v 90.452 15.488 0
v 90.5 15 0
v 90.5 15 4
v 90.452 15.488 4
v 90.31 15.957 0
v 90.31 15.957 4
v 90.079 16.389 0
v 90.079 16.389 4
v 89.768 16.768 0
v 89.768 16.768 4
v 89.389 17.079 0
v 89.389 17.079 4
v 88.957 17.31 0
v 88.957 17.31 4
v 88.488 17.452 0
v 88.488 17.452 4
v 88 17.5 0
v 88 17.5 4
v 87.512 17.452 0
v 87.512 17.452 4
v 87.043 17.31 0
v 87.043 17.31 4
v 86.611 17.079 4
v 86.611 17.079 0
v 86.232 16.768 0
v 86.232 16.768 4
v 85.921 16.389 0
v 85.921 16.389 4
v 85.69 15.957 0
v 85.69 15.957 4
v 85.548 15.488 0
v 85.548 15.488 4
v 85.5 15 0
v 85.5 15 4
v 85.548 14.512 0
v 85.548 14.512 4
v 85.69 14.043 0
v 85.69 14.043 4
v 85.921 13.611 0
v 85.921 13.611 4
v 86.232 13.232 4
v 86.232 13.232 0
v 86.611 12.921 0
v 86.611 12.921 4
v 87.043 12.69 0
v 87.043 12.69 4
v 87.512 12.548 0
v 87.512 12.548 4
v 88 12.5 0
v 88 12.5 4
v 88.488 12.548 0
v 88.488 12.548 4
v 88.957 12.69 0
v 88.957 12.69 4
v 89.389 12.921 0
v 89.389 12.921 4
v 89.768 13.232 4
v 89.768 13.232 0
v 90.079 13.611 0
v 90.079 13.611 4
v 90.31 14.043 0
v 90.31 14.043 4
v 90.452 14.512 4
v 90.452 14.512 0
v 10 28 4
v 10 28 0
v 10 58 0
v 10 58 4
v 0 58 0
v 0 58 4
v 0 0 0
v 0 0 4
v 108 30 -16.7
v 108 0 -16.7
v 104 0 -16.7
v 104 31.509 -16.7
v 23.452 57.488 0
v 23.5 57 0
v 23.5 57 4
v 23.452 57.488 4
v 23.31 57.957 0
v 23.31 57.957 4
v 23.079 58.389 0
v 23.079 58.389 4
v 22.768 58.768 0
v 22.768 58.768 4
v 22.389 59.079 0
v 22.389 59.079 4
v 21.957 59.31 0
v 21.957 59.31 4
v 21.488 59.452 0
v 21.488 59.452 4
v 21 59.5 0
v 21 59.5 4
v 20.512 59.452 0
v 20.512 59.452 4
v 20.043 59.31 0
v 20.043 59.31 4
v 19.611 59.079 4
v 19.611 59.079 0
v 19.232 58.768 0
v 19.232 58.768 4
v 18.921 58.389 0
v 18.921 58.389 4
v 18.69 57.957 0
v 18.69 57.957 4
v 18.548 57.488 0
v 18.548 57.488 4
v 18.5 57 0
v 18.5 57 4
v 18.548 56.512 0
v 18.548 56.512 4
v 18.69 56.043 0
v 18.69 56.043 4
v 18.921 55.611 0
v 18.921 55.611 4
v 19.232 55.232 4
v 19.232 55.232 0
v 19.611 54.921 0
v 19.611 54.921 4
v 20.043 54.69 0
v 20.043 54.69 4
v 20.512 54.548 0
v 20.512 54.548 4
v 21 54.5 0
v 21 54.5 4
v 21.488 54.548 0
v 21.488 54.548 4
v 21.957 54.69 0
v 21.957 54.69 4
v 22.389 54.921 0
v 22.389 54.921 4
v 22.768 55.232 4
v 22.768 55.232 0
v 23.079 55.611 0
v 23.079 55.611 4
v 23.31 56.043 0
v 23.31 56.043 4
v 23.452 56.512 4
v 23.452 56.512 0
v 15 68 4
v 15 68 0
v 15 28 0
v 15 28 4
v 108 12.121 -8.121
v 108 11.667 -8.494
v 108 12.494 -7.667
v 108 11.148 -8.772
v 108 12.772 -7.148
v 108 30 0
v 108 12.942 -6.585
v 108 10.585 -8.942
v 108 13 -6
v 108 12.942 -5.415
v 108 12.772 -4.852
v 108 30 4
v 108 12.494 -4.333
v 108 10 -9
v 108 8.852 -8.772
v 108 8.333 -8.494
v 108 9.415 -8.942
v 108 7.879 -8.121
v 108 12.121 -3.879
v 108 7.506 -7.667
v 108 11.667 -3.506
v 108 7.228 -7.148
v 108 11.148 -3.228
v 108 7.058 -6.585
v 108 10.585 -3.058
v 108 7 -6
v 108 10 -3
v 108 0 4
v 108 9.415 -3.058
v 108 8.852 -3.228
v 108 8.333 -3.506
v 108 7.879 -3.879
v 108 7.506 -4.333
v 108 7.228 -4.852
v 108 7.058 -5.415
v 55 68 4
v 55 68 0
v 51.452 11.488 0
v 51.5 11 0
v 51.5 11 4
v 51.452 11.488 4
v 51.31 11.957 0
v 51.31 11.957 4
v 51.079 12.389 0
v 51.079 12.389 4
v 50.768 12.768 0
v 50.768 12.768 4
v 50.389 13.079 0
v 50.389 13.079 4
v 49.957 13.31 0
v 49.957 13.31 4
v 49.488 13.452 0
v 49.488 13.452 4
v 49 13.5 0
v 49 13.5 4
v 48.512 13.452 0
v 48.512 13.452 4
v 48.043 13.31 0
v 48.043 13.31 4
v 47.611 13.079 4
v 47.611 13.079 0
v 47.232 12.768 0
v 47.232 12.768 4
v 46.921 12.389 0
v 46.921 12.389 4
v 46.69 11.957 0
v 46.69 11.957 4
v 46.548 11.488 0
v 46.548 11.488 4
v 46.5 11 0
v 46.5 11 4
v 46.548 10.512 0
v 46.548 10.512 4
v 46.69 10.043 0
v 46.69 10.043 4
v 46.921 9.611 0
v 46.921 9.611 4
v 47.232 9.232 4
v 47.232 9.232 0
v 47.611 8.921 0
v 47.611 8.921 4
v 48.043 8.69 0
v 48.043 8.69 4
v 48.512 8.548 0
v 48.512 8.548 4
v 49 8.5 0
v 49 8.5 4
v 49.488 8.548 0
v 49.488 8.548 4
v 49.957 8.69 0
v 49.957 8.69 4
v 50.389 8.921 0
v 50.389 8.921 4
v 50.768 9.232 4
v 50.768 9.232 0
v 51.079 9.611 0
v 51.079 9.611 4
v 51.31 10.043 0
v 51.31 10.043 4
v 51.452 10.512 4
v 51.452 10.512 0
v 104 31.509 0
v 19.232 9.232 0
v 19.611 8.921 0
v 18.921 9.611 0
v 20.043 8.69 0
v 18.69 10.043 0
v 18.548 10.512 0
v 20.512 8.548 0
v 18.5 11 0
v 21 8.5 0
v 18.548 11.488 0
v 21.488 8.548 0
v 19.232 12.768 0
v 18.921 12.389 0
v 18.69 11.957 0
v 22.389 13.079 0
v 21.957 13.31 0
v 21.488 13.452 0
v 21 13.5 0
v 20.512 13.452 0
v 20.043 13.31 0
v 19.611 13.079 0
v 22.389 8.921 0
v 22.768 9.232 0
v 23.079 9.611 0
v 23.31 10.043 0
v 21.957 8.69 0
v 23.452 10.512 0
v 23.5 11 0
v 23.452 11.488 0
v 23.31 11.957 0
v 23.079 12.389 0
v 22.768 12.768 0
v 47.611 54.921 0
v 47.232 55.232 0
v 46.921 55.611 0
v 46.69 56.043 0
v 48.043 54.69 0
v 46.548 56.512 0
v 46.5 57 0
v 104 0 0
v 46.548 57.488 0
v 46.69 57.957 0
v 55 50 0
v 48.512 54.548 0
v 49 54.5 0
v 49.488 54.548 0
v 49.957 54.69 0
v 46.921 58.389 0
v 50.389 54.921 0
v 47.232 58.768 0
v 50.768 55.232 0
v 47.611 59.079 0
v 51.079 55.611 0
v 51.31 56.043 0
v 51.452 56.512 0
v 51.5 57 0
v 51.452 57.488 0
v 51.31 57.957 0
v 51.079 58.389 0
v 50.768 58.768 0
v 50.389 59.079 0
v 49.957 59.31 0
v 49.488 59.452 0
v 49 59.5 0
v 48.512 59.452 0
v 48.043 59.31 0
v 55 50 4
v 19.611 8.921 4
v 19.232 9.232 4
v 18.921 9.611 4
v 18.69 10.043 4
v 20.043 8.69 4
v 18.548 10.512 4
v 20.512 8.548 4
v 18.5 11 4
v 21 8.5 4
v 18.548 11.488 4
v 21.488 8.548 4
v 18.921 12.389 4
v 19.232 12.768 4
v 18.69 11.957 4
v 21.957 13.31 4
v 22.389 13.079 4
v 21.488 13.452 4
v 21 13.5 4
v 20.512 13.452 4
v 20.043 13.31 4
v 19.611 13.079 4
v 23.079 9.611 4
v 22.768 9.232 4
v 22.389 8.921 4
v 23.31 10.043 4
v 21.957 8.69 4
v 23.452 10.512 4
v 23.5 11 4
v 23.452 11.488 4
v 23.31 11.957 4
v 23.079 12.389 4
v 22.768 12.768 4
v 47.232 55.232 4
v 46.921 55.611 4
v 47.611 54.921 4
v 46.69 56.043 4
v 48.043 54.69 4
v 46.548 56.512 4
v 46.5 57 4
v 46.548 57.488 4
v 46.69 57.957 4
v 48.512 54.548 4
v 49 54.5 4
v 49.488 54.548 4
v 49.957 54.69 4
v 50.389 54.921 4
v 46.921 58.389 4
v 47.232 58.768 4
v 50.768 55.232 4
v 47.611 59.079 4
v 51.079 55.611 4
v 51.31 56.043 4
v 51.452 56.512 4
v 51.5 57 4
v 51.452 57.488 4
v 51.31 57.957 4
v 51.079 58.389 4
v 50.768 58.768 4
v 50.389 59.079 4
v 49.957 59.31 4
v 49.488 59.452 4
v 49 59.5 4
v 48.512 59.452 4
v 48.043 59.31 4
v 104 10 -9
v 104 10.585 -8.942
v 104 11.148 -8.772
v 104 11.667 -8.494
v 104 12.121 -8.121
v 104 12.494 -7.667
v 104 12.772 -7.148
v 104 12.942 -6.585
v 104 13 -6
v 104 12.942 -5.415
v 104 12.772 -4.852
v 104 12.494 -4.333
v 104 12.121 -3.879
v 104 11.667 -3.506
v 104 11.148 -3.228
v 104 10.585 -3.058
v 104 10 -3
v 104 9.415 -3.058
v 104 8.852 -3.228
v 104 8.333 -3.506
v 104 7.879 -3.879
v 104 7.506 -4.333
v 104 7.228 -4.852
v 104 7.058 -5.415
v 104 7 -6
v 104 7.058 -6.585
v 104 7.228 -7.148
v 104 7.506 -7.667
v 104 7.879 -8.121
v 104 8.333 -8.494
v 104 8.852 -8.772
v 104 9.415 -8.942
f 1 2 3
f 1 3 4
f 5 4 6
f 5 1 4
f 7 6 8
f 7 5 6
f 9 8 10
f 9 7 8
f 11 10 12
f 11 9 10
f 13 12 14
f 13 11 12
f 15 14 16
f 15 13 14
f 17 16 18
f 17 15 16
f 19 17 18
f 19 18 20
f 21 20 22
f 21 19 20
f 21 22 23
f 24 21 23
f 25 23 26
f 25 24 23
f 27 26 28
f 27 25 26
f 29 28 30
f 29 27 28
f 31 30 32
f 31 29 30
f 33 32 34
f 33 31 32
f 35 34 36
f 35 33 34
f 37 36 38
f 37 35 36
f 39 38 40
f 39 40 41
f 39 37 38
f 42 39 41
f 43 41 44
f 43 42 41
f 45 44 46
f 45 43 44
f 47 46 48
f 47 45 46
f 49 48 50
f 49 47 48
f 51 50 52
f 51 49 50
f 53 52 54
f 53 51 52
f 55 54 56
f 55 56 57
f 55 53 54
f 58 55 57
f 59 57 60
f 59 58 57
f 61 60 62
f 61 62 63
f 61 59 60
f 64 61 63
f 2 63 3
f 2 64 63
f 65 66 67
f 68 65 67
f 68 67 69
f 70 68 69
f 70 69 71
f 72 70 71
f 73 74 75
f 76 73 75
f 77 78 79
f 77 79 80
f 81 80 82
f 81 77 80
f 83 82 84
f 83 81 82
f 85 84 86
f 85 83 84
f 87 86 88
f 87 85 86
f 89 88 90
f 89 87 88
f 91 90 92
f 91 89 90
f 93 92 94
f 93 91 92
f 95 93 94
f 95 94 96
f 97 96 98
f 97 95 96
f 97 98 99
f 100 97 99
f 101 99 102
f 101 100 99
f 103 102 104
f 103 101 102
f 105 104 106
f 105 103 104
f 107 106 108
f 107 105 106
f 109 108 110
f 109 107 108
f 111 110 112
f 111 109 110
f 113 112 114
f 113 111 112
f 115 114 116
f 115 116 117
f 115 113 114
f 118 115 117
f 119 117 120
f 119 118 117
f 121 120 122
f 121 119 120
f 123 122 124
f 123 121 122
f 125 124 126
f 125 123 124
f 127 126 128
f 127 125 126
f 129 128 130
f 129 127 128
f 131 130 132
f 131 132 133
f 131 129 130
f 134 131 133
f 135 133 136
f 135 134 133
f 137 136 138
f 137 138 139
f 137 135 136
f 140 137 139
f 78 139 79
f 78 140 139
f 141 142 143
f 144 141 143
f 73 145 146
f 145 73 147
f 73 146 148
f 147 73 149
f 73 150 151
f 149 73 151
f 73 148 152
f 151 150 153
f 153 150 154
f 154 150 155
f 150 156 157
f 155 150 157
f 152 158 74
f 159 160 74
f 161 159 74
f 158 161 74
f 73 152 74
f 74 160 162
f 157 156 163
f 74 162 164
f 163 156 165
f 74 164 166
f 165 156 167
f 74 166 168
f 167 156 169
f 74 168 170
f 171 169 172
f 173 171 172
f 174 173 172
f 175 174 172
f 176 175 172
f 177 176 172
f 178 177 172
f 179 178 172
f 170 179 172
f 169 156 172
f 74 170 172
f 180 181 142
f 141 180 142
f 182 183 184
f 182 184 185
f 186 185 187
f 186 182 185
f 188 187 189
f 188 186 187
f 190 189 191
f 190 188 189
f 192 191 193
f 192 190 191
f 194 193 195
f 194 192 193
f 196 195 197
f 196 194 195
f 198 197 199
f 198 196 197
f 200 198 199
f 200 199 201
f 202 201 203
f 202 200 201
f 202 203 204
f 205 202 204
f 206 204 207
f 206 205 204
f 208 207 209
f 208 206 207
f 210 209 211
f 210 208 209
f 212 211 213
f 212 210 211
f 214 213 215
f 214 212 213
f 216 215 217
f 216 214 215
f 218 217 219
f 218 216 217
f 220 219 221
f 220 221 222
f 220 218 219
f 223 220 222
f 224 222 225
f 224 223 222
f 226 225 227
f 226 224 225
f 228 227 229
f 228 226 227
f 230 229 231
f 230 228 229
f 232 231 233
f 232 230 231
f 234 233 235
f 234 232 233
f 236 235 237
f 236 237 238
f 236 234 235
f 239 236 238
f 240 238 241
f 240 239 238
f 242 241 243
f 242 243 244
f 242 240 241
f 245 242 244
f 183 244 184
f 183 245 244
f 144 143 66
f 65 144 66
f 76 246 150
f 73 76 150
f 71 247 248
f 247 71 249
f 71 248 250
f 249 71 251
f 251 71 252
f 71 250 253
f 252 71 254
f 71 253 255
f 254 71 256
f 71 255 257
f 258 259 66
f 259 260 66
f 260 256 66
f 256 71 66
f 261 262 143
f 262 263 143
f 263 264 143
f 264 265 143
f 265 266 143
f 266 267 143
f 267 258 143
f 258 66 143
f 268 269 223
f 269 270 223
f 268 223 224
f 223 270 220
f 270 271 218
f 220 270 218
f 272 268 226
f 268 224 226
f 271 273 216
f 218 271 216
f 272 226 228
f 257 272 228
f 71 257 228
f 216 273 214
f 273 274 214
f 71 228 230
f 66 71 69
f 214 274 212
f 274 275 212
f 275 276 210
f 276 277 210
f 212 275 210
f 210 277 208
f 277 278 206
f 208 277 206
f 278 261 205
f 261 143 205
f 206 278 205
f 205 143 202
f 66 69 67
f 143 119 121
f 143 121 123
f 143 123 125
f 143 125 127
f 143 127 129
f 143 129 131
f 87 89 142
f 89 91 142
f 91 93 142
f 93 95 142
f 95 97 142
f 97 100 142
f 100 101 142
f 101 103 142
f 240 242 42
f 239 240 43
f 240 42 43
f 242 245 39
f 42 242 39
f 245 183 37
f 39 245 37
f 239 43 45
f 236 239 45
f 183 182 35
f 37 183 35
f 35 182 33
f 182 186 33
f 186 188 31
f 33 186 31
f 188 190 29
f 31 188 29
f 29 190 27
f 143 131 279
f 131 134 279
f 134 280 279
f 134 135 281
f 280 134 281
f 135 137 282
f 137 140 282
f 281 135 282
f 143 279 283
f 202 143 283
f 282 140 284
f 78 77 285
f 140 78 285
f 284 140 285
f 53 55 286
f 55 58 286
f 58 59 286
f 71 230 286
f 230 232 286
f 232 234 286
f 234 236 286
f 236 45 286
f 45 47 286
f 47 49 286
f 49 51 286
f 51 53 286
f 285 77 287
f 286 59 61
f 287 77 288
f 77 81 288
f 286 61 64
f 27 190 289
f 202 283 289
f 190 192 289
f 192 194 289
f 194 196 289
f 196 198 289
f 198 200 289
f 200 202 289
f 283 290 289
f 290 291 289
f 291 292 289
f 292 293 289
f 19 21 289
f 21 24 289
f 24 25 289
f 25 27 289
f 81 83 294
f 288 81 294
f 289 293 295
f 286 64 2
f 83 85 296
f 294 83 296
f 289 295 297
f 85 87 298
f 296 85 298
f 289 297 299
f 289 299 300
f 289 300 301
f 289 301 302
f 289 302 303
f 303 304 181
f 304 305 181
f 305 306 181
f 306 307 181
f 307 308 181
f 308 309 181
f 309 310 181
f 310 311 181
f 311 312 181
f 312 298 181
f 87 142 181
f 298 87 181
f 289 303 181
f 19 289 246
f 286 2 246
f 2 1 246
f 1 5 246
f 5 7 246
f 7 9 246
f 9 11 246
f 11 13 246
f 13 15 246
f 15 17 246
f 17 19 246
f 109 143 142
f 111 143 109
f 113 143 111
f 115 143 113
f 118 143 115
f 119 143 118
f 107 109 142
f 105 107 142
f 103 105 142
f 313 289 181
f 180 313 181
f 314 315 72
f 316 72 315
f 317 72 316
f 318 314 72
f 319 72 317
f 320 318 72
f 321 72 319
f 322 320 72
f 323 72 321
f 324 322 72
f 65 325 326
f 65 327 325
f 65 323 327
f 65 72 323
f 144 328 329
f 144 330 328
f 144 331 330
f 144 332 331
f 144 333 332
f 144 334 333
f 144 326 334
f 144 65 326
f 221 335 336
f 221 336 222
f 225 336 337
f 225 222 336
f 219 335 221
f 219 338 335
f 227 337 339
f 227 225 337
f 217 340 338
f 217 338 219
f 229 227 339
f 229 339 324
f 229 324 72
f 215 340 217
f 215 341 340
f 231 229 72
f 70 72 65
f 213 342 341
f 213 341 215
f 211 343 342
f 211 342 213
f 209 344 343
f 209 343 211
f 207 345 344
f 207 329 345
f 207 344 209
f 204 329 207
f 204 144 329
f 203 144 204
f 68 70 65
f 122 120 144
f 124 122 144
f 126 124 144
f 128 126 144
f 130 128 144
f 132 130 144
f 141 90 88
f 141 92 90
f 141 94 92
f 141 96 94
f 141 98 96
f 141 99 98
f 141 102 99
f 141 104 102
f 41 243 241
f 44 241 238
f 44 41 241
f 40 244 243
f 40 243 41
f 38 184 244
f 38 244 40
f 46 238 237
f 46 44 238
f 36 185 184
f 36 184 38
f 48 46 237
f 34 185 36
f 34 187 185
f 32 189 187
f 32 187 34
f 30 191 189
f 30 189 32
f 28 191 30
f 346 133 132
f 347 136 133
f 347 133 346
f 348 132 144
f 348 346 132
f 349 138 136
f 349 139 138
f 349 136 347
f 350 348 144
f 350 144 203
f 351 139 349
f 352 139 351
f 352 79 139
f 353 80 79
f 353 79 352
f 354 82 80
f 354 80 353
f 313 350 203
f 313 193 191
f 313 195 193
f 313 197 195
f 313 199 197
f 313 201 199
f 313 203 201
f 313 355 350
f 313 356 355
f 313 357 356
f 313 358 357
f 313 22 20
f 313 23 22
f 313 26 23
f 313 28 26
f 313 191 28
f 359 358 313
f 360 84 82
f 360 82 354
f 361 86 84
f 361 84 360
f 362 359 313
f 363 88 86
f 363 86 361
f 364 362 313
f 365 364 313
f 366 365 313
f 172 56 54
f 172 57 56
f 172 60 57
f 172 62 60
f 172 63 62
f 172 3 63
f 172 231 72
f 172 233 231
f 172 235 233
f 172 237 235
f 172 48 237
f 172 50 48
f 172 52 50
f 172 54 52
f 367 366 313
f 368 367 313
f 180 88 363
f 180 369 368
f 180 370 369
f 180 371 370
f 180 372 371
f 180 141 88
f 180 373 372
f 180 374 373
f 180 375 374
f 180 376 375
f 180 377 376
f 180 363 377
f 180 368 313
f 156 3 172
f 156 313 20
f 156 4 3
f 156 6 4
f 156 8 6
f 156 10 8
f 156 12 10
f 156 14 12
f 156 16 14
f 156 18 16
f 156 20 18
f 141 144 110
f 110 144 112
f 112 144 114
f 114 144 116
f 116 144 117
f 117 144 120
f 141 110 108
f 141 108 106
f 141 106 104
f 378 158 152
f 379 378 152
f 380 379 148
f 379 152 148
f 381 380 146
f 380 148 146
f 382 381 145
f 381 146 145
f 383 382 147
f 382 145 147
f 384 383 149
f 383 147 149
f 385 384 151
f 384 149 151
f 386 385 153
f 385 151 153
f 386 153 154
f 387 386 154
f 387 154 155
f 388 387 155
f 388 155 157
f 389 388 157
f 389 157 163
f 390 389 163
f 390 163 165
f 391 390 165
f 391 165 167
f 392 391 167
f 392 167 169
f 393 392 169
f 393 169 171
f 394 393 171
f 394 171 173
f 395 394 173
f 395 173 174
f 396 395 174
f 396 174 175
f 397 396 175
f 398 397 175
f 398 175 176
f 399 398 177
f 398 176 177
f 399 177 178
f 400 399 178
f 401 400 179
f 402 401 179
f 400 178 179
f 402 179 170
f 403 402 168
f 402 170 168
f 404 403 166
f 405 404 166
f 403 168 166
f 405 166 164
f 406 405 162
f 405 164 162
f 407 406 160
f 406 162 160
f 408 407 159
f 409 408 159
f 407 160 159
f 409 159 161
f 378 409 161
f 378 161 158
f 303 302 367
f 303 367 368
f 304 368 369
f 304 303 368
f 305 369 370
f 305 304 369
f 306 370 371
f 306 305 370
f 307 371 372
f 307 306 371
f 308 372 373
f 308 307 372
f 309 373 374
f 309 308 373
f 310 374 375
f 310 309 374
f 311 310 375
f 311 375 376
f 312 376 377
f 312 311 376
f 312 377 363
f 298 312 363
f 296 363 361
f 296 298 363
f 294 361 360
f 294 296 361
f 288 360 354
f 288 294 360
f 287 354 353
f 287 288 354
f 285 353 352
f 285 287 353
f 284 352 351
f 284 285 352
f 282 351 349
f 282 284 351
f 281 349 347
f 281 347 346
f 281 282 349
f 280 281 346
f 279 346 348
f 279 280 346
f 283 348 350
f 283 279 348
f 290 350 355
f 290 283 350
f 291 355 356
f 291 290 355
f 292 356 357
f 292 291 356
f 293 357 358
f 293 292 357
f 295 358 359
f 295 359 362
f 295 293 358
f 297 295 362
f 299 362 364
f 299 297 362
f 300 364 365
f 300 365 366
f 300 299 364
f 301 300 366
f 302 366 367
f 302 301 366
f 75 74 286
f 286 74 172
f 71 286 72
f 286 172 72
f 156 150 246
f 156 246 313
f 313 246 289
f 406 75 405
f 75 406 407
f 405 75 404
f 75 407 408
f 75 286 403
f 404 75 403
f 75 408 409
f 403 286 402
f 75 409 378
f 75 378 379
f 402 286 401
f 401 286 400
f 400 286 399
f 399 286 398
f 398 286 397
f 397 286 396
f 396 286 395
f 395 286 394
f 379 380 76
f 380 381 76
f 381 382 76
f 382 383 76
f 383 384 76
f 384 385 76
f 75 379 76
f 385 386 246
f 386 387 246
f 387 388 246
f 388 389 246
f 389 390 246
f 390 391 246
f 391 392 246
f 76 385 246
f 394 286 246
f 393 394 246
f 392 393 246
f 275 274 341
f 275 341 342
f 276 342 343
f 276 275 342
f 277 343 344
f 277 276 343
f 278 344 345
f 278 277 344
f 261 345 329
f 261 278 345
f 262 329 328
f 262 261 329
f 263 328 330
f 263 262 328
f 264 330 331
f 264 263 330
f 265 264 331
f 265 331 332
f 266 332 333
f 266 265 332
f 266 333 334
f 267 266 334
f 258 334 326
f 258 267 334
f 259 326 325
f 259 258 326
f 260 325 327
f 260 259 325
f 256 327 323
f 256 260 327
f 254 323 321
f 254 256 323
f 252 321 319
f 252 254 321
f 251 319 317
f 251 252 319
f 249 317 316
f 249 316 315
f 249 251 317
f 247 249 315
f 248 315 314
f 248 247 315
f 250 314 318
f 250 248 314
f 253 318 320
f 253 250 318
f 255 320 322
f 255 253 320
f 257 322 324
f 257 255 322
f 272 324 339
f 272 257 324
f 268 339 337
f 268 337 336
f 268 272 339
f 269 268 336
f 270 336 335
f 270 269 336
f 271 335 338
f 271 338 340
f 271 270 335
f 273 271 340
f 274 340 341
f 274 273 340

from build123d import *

# Parameters (mm, degrees)
SKETCH_1_R          = 2.5
EXTRUDE_1_DEPTH     = 4
EXTRUDE_2_DEPTH     = 20.7
SKETCH_3_R          = 3
CUT_EXTRUDE_1_DEPTH = 6.7
CUT_EXTRUDE_2_DEPTH = 10


with BuildPart() as part:
    # Эскиз1 → Бобышка-Вытянуть1 (new body)
    with BuildSketch(Plane.XY):
        Polygon((0, 0), (108, 0), (108, 30), (55, 50), (55, 68), (0, 68), align=None)
        with Locations((21, 57)):
            Circle(SKETCH_1_R, mode=Mode.SUBTRACT)
        with Locations((49, 57)):
            Circle(SKETCH_1_R, mode=Mode.SUBTRACT)
        with Locations((21, 11)):
            Circle(SKETCH_1_R, mode=Mode.SUBTRACT)
        with Locations((49, 11)):
            Circle(SKETCH_1_R, mode=Mode.SUBTRACT)
        with Locations((88, 15)):
            Circle(SKETCH_1_R, mode=Mode.SUBTRACT)
    extrude(amount=EXTRUDE_1_DEPTH)

    # Эскиз2 → Бобышка-Вытянуть2 (add)
    with BuildSketch(Plane.XY.offset(4)):
        Polygon((108, 0), (104, 0), (104, 31.509433962), (108, 30), align=None)
    extrude(amount=-EXTRUDE_2_DEPTH)

    # Эскиз3 → Вырез-Вытянуть1 (cut)
    with BuildSketch(Plane(origin=(108, 0, 0), x_dir=(0, 0, -1), z_dir=(1, 0, 0))):
        with Locations((6, 10)):
            Circle(SKETCH_3_R)
    extrude(amount=-CUT_EXTRUDE_1_DEPTH, mode=Mode.SUBTRACT)

    # Эскиз4 → Вырез-Вытянуть2 (cut)
    with BuildSketch(Plane(origin=(0, 0, 0), x_dir=(-1, 0, 0), z_dir=(0, 0, -1))):
        Polygon((0, 68), (-15, 68), (-15, 48), (-15, 28), (-10, 28), (-10, 58), (0, 58), align=None)
    extrude(amount=-CUT_EXTRUDE_2_DEPTH, mode=Mode.SUBTRACT)


solid = part.part
